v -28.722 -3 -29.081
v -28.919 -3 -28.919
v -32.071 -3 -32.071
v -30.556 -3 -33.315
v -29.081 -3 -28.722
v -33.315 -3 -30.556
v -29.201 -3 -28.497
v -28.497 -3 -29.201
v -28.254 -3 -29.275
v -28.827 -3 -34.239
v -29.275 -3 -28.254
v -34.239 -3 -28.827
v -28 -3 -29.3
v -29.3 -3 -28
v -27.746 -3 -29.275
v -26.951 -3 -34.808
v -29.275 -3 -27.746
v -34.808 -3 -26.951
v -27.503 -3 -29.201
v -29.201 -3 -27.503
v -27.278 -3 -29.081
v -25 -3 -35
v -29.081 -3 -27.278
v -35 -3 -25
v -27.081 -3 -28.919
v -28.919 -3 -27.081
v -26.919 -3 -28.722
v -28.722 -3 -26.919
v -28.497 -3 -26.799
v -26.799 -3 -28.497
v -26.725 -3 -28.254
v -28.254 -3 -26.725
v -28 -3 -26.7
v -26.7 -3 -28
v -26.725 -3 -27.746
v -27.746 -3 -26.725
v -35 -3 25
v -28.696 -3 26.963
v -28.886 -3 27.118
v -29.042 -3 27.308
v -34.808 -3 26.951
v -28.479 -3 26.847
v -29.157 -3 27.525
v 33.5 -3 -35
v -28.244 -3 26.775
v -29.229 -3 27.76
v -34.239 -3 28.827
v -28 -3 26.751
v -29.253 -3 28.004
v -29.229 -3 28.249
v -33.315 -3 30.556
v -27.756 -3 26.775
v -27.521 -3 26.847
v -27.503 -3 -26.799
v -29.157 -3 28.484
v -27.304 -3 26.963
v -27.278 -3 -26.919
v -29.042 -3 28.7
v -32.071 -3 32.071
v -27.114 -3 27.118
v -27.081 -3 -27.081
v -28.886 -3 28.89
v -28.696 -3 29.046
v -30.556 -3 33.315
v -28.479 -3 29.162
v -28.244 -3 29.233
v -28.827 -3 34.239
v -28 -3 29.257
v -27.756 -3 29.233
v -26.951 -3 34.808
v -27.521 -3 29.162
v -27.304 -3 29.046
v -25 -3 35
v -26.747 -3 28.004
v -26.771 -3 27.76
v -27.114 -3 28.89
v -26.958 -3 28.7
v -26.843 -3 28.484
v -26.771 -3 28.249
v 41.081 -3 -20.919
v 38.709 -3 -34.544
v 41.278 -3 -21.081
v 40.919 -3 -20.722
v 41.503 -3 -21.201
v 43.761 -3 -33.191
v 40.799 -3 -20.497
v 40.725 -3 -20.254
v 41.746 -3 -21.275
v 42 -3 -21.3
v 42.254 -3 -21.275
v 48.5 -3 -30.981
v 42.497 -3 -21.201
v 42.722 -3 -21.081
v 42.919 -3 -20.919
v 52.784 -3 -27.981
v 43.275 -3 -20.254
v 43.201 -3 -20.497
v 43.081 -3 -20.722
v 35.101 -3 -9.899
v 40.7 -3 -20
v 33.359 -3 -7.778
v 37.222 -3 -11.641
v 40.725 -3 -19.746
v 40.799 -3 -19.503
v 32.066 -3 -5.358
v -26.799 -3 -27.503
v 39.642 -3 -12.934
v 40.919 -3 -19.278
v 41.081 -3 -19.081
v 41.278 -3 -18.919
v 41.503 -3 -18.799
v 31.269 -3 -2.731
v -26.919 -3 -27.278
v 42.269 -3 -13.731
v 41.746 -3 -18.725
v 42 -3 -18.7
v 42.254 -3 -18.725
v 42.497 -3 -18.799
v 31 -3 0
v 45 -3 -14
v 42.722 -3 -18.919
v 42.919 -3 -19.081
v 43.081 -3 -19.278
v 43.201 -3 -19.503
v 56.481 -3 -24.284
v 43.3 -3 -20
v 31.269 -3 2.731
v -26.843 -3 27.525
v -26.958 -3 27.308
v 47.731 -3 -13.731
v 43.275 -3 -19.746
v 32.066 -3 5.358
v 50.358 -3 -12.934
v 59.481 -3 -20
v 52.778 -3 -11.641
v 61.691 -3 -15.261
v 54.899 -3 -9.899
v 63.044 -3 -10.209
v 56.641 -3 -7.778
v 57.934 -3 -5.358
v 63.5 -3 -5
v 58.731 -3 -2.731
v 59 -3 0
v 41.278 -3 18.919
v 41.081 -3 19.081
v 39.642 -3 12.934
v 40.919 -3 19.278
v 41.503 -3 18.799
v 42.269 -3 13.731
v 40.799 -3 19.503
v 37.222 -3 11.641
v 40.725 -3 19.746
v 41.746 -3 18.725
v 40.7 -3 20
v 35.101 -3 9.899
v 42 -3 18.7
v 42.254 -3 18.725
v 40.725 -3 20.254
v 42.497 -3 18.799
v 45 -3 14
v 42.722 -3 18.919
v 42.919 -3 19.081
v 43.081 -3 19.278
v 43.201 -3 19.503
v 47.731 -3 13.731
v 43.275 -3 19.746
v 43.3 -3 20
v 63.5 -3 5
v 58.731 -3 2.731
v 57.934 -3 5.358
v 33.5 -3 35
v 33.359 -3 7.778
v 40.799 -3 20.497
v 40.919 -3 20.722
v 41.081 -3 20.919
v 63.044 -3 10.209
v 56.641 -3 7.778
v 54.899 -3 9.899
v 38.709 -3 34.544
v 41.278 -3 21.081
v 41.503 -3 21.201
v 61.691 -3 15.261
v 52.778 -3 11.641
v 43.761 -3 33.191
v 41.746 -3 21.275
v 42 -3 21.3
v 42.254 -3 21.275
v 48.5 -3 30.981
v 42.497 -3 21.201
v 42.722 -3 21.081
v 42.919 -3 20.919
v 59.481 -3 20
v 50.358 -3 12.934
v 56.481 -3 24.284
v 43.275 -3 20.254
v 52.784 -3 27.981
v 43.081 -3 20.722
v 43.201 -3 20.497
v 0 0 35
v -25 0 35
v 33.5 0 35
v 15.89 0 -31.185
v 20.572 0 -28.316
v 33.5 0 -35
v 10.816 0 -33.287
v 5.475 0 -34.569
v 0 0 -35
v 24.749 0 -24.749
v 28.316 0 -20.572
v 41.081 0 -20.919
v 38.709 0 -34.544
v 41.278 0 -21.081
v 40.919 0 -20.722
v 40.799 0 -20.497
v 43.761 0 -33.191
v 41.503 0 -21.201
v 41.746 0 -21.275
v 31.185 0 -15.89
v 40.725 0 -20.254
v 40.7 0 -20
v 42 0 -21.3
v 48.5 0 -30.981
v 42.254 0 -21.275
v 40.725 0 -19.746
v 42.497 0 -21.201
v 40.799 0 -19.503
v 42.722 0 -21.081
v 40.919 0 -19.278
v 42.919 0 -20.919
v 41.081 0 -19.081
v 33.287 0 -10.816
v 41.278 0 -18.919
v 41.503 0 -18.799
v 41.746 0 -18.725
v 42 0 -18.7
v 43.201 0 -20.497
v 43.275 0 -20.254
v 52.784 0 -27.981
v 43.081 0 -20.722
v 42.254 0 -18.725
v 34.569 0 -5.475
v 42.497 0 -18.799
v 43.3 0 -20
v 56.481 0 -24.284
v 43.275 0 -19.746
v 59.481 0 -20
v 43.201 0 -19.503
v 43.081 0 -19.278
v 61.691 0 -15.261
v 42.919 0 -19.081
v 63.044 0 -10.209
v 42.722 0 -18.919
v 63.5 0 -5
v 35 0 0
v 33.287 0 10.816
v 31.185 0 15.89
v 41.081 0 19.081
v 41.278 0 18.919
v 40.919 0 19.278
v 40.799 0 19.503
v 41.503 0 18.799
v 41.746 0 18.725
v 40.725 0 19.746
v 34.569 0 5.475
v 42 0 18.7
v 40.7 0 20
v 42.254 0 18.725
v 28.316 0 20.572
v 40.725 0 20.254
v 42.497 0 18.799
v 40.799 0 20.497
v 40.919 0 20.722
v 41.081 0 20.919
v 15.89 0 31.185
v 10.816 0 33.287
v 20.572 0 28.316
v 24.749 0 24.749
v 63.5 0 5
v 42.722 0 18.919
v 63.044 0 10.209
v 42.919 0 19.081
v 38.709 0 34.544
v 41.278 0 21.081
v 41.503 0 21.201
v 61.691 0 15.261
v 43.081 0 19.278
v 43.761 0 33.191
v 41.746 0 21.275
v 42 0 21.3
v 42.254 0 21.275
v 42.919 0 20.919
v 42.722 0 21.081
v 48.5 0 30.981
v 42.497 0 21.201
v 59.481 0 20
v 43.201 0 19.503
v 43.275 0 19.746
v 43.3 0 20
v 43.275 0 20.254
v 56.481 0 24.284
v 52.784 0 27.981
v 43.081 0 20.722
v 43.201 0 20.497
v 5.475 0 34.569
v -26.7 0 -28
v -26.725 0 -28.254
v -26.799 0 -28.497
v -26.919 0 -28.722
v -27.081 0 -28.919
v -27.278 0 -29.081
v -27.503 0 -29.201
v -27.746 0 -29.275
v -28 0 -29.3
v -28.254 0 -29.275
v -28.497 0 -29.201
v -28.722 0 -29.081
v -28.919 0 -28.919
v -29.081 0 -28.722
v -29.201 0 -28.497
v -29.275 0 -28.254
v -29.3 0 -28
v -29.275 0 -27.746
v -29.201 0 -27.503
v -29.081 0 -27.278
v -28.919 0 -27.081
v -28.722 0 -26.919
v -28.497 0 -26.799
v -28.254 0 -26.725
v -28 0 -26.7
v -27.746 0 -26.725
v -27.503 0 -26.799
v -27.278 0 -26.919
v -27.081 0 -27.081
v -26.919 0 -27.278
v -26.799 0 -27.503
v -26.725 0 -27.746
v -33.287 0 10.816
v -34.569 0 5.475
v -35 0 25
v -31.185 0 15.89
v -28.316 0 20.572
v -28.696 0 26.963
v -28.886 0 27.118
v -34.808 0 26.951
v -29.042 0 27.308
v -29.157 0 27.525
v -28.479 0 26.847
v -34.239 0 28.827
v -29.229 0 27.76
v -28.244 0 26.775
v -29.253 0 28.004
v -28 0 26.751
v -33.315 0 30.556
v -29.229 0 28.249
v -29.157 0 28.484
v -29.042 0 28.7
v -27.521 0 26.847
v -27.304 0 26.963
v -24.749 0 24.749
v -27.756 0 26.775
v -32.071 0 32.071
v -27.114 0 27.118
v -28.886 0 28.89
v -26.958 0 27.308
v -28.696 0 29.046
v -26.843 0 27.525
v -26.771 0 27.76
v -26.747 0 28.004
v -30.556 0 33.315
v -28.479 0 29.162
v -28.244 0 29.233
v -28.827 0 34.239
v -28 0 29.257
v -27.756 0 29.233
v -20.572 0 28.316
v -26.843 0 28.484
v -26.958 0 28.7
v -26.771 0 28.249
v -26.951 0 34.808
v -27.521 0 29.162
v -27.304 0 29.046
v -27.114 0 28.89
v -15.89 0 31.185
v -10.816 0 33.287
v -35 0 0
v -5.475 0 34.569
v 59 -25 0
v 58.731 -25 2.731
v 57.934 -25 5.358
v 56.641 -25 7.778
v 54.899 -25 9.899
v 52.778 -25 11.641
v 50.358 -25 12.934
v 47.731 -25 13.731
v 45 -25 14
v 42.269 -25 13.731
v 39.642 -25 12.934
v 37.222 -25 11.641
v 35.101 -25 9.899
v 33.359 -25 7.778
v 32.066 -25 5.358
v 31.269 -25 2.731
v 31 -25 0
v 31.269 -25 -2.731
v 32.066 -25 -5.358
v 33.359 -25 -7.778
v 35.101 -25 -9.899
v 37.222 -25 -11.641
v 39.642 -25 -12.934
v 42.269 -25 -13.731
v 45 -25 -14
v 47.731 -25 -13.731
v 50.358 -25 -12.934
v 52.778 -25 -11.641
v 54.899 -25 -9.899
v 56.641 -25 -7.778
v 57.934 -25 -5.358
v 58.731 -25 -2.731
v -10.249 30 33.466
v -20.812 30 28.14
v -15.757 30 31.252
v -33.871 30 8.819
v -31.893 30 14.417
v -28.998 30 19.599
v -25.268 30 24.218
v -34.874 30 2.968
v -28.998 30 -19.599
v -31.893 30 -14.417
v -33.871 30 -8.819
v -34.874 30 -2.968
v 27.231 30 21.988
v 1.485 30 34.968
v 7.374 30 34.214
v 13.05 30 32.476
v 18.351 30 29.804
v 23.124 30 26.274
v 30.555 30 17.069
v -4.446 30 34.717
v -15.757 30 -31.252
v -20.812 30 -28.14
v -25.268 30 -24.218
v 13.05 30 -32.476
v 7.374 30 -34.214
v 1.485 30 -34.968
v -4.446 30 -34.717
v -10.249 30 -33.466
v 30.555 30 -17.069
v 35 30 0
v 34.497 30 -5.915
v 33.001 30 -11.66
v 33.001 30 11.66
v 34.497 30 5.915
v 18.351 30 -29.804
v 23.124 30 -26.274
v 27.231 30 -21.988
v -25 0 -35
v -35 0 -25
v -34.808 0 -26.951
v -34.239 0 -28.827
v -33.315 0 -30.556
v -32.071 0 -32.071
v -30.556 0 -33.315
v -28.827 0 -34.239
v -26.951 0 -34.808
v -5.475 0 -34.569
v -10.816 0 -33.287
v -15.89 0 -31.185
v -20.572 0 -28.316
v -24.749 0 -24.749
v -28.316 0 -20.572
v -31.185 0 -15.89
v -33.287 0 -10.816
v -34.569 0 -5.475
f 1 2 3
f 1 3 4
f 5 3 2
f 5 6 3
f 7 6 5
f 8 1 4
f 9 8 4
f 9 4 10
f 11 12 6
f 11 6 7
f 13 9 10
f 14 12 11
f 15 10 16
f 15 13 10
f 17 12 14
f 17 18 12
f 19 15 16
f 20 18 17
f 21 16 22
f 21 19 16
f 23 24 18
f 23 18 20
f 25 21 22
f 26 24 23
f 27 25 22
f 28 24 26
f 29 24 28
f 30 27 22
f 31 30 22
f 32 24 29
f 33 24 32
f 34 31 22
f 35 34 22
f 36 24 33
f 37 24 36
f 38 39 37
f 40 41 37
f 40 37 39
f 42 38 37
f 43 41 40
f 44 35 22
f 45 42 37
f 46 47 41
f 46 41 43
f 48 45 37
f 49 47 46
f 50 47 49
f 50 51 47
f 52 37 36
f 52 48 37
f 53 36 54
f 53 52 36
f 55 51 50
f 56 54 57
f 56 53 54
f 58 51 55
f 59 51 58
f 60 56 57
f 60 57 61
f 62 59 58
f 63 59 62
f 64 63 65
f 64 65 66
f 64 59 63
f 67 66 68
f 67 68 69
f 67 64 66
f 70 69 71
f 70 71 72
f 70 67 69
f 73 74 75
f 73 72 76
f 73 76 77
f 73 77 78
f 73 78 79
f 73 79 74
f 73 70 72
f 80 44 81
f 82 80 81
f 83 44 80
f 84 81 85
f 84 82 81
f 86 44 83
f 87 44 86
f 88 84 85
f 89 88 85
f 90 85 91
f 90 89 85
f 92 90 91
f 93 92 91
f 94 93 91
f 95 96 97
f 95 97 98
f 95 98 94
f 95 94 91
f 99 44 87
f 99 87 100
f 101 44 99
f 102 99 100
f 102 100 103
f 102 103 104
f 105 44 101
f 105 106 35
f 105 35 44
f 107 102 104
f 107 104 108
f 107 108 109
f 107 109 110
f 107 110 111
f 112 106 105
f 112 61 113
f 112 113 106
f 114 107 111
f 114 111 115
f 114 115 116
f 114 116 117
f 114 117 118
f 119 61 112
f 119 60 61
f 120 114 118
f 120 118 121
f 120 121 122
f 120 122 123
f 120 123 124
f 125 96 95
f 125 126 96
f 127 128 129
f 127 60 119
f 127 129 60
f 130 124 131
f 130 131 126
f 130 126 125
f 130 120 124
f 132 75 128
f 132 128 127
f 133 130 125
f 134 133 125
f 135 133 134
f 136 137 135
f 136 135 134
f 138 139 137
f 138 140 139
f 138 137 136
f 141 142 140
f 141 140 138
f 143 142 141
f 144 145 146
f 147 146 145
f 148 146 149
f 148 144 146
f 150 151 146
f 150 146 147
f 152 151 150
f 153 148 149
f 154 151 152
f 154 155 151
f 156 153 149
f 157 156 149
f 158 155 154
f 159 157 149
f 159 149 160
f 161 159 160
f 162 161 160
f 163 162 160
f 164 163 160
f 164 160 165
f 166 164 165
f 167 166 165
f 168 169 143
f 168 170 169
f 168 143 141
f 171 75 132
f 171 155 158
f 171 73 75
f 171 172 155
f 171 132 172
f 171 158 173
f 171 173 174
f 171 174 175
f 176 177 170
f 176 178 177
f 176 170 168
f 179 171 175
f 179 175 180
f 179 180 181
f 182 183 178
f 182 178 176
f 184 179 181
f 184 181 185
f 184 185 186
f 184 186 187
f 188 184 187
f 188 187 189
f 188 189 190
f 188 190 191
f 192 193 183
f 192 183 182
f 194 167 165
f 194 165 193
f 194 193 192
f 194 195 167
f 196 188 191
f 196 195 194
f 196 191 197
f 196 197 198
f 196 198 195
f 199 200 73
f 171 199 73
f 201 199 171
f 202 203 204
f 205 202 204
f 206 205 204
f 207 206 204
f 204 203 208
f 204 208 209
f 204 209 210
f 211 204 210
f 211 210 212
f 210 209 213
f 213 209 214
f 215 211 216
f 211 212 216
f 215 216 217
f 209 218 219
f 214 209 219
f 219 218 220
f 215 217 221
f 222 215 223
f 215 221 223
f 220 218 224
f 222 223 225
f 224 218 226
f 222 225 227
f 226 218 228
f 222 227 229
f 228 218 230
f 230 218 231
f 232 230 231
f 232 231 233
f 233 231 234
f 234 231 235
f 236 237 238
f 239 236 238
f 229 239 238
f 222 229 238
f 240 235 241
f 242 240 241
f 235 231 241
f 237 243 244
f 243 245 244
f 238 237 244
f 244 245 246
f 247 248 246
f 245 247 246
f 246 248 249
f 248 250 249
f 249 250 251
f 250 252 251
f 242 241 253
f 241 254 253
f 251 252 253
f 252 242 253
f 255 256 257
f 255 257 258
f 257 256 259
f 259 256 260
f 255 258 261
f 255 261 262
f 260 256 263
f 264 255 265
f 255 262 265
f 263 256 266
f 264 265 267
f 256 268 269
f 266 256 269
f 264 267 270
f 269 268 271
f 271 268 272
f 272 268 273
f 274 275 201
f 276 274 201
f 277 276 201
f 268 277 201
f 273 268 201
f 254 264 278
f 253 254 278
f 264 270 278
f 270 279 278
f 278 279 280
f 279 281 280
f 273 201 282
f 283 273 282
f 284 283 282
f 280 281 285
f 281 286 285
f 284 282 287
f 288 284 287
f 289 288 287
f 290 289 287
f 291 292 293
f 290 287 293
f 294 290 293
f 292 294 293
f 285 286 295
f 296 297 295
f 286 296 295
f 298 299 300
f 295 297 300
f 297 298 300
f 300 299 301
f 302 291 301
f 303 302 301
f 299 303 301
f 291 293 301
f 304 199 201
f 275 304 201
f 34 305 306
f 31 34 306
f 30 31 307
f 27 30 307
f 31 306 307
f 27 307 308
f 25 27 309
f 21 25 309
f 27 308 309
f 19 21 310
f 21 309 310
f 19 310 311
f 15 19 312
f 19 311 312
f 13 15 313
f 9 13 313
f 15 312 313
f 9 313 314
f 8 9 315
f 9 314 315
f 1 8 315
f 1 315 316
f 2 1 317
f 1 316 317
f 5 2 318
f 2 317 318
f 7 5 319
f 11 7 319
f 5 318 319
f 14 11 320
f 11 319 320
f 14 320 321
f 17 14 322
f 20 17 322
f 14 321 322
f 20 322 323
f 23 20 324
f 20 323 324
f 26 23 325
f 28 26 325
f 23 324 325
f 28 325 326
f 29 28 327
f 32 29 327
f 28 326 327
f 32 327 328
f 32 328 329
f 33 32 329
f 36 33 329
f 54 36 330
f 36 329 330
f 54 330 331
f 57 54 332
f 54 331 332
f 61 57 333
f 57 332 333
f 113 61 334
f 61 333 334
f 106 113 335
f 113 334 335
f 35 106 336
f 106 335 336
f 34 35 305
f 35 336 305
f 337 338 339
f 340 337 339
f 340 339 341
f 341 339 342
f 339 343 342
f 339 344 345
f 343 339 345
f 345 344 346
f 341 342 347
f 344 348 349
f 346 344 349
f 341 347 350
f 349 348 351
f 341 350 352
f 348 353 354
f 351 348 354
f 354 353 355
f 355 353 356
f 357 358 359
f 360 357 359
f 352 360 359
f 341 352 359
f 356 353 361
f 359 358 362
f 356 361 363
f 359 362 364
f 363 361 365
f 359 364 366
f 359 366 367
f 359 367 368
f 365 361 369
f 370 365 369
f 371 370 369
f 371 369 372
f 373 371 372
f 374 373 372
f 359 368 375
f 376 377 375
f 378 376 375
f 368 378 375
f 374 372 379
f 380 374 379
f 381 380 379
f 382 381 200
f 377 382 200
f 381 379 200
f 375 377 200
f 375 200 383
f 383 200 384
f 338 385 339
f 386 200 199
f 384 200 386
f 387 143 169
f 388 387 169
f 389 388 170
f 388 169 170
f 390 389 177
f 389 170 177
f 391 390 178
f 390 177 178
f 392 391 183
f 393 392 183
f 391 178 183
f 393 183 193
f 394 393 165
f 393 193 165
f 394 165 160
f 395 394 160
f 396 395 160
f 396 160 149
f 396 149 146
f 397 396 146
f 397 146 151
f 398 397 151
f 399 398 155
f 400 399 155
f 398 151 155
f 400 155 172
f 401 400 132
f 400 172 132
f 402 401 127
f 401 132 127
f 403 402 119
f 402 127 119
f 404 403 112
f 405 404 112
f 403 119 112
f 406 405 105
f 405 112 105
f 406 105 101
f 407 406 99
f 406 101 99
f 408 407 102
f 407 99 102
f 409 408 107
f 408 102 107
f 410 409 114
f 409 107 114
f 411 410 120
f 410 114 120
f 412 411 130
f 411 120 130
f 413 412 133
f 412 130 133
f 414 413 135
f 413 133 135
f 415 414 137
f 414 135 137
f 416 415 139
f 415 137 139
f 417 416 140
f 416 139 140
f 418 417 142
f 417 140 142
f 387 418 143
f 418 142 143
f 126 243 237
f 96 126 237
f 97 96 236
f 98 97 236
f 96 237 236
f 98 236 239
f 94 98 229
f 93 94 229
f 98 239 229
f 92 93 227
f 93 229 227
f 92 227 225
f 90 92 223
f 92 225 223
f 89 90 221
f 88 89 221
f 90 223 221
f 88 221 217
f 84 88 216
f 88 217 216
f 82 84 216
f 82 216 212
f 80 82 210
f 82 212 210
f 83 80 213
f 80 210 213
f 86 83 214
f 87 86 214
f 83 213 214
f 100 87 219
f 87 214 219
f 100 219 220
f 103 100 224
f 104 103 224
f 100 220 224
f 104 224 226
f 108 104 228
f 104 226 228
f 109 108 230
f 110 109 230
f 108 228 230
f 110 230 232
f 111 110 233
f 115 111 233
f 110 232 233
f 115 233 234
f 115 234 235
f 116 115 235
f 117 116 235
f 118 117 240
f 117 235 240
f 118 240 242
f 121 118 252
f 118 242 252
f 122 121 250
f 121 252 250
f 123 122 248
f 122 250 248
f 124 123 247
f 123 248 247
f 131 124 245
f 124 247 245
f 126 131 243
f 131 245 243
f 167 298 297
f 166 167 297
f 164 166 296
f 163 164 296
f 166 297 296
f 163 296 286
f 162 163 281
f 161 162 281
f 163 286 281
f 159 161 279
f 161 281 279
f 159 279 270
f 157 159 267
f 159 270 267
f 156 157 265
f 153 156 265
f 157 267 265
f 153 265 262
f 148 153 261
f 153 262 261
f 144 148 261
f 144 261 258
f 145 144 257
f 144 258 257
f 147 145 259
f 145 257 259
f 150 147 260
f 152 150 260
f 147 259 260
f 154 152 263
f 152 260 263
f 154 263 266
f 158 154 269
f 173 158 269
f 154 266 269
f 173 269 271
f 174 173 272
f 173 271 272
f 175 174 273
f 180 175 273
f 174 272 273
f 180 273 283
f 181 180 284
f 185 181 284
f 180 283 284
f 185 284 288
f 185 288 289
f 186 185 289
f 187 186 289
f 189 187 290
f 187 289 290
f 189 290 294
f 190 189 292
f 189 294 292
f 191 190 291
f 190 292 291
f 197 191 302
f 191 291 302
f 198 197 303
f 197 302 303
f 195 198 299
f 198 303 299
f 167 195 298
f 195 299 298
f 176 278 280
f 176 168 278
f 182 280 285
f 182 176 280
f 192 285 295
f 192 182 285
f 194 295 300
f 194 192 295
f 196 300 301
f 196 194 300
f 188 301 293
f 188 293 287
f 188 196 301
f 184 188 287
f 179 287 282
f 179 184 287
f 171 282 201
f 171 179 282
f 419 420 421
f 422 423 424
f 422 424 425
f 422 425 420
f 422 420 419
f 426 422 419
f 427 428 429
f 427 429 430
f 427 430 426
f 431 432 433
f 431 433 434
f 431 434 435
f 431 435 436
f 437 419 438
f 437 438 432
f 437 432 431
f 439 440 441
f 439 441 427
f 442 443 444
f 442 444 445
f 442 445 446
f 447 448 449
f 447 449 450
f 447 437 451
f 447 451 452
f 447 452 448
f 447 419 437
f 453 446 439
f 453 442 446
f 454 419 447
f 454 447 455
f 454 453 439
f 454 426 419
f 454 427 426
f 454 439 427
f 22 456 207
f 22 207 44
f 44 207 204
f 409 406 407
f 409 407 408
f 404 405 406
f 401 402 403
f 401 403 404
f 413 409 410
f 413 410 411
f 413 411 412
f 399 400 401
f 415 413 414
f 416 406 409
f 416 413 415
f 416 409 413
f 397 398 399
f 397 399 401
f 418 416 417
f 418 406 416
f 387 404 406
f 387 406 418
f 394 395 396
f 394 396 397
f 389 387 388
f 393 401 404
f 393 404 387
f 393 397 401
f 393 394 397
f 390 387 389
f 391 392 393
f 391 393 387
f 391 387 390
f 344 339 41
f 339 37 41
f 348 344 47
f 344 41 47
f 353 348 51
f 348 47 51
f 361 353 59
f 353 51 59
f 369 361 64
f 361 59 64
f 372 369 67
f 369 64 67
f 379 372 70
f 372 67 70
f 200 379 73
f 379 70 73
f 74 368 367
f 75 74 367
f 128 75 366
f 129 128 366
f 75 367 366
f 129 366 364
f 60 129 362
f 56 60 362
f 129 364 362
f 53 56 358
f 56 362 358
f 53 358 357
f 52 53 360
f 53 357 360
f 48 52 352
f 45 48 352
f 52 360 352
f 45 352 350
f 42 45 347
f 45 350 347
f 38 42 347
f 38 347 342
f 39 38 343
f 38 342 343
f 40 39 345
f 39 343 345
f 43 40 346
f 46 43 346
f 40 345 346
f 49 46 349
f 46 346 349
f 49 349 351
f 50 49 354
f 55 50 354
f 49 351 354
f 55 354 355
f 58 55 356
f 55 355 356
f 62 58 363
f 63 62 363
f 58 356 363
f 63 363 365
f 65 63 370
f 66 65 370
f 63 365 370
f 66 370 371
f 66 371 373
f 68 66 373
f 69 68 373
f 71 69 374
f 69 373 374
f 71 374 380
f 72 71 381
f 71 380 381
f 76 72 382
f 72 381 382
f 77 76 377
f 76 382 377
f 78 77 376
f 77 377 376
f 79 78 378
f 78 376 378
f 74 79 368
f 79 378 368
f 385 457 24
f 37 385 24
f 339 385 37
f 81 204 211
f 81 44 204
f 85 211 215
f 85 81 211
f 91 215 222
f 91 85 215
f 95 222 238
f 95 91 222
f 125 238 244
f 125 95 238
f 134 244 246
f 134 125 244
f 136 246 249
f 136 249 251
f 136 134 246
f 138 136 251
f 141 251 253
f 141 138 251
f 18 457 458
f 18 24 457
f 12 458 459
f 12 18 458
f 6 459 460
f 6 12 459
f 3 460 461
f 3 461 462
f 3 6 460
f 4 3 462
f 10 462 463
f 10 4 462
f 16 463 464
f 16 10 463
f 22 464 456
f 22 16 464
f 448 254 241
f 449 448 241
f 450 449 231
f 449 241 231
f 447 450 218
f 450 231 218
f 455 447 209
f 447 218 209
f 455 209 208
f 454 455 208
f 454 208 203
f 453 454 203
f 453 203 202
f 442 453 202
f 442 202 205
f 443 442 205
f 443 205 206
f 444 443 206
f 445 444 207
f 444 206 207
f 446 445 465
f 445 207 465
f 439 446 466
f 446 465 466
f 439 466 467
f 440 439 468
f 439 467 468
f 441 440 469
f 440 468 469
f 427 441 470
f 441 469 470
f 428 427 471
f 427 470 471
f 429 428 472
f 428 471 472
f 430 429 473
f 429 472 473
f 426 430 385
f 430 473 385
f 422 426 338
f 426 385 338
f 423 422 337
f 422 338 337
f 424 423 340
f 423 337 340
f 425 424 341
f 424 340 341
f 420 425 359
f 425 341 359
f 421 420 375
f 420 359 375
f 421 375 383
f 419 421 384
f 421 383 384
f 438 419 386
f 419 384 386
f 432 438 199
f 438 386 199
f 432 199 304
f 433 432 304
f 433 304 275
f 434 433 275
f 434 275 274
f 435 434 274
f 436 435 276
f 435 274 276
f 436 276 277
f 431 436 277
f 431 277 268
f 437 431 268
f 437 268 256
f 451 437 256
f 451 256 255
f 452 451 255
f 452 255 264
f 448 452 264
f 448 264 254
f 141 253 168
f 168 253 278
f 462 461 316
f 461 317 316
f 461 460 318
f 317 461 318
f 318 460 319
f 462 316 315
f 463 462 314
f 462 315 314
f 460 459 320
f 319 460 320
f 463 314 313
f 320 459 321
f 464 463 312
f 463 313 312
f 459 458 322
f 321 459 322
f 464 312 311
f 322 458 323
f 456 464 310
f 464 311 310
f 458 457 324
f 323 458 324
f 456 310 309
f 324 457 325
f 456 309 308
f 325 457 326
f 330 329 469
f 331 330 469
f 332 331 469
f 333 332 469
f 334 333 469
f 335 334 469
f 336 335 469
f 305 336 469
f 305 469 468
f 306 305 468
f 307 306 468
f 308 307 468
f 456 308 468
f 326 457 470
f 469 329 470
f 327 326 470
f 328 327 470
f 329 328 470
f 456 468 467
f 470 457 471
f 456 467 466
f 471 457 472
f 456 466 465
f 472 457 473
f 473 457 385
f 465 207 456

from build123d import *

# Parameters (mm, degrees)
SKETCH_1_R          = 35
EXTRUDE_1_DEPTH     = 30
SKETCH_2_W          = 98.5
SKETCH_2_H          = 70
EXTRUDE_2_DEPTH     = 3
FILLET_1_R          = 10
FILLET_2_R          = 30
FILLET_3_R          = 30
SKETCH_3_R          = 1.3
SKETCH_3_R_2        = 1.252848492
CUT_EXTRUDE_1_DEPTH = 3
SKETCH_4_R          = 14
EXTRUDE_3_DEPTH     = 22


with BuildPart() as part:
    # 스케치1 → 보스-돌출1 (new body)
    with BuildSketch(Plane(origin=(0, 0, 0), x_dir=(1, 0, 0), z_dir=(0, 1, 0))):
        Circle(SKETCH_1_R)
    extrude(amount=EXTRUDE_1_DEPTH)

    # 스케치2 → 보스-돌출2 (add)
    with BuildSketch(Plane.XZ):
        with Locations((14.25, 0)):
            Rectangle(SKETCH_2_W, SKETCH_2_H)
    extrude(amount=EXTRUDE_2_DEPTH)

    # 필렛1
    fillet_1_edges = [part.edges().sort_by_distance(p)[0] for p in [
        (-35, -1.5, 35),
        (-35, -1.5, -35),
    ]]
    fillet(fillet_1_edges, radius=FILLET_1_R)

    # 필렛2
    fillet_2_edges = [part.edges().sort_by_distance(p)[0] for p in [
        (63.5, -1.5, -35),
    ]]
    fillet(fillet_2_edges, radius=FILLET_2_R)

    # 필렛3
    fillet_3_edges = [part.edges().sort_by_distance(p)[0] for p in [
        (63.5, -1.5, 35),
    ]]
    fillet(fillet_3_edges, radius=FILLET_3_R)

    # 스케치3 → 컷-돌출1 (cut)
    with BuildSketch(Plane(origin=(0, 0, 0), x_dir=(1, 0, 0), z_dir=(0, 1, 0))):
        with Locations((-28, 28)):
            Circle(SKETCH_3_R)
        with Locations((-28, -28.00420951)):
            Circle(SKETCH_3_R_2)
        with Locations((42, 20)):
            Circle(SKETCH_3_R)
        with Locations((42, -20)):
            Circle(SKETCH_3_R)
    extrude(amount=-CUT_EXTRUDE_1_DEPTH, mode=Mode.SUBTRACT)

    # 스케치4 → 보스-돌출3 (add)
    with BuildSketch(Plane.XZ.offset(3)):
        with Locations((45, 0)):
            Circle(SKETCH_4_R)
    extrude(amount=EXTRUDE_3_DEPTH)


solid = part.part
